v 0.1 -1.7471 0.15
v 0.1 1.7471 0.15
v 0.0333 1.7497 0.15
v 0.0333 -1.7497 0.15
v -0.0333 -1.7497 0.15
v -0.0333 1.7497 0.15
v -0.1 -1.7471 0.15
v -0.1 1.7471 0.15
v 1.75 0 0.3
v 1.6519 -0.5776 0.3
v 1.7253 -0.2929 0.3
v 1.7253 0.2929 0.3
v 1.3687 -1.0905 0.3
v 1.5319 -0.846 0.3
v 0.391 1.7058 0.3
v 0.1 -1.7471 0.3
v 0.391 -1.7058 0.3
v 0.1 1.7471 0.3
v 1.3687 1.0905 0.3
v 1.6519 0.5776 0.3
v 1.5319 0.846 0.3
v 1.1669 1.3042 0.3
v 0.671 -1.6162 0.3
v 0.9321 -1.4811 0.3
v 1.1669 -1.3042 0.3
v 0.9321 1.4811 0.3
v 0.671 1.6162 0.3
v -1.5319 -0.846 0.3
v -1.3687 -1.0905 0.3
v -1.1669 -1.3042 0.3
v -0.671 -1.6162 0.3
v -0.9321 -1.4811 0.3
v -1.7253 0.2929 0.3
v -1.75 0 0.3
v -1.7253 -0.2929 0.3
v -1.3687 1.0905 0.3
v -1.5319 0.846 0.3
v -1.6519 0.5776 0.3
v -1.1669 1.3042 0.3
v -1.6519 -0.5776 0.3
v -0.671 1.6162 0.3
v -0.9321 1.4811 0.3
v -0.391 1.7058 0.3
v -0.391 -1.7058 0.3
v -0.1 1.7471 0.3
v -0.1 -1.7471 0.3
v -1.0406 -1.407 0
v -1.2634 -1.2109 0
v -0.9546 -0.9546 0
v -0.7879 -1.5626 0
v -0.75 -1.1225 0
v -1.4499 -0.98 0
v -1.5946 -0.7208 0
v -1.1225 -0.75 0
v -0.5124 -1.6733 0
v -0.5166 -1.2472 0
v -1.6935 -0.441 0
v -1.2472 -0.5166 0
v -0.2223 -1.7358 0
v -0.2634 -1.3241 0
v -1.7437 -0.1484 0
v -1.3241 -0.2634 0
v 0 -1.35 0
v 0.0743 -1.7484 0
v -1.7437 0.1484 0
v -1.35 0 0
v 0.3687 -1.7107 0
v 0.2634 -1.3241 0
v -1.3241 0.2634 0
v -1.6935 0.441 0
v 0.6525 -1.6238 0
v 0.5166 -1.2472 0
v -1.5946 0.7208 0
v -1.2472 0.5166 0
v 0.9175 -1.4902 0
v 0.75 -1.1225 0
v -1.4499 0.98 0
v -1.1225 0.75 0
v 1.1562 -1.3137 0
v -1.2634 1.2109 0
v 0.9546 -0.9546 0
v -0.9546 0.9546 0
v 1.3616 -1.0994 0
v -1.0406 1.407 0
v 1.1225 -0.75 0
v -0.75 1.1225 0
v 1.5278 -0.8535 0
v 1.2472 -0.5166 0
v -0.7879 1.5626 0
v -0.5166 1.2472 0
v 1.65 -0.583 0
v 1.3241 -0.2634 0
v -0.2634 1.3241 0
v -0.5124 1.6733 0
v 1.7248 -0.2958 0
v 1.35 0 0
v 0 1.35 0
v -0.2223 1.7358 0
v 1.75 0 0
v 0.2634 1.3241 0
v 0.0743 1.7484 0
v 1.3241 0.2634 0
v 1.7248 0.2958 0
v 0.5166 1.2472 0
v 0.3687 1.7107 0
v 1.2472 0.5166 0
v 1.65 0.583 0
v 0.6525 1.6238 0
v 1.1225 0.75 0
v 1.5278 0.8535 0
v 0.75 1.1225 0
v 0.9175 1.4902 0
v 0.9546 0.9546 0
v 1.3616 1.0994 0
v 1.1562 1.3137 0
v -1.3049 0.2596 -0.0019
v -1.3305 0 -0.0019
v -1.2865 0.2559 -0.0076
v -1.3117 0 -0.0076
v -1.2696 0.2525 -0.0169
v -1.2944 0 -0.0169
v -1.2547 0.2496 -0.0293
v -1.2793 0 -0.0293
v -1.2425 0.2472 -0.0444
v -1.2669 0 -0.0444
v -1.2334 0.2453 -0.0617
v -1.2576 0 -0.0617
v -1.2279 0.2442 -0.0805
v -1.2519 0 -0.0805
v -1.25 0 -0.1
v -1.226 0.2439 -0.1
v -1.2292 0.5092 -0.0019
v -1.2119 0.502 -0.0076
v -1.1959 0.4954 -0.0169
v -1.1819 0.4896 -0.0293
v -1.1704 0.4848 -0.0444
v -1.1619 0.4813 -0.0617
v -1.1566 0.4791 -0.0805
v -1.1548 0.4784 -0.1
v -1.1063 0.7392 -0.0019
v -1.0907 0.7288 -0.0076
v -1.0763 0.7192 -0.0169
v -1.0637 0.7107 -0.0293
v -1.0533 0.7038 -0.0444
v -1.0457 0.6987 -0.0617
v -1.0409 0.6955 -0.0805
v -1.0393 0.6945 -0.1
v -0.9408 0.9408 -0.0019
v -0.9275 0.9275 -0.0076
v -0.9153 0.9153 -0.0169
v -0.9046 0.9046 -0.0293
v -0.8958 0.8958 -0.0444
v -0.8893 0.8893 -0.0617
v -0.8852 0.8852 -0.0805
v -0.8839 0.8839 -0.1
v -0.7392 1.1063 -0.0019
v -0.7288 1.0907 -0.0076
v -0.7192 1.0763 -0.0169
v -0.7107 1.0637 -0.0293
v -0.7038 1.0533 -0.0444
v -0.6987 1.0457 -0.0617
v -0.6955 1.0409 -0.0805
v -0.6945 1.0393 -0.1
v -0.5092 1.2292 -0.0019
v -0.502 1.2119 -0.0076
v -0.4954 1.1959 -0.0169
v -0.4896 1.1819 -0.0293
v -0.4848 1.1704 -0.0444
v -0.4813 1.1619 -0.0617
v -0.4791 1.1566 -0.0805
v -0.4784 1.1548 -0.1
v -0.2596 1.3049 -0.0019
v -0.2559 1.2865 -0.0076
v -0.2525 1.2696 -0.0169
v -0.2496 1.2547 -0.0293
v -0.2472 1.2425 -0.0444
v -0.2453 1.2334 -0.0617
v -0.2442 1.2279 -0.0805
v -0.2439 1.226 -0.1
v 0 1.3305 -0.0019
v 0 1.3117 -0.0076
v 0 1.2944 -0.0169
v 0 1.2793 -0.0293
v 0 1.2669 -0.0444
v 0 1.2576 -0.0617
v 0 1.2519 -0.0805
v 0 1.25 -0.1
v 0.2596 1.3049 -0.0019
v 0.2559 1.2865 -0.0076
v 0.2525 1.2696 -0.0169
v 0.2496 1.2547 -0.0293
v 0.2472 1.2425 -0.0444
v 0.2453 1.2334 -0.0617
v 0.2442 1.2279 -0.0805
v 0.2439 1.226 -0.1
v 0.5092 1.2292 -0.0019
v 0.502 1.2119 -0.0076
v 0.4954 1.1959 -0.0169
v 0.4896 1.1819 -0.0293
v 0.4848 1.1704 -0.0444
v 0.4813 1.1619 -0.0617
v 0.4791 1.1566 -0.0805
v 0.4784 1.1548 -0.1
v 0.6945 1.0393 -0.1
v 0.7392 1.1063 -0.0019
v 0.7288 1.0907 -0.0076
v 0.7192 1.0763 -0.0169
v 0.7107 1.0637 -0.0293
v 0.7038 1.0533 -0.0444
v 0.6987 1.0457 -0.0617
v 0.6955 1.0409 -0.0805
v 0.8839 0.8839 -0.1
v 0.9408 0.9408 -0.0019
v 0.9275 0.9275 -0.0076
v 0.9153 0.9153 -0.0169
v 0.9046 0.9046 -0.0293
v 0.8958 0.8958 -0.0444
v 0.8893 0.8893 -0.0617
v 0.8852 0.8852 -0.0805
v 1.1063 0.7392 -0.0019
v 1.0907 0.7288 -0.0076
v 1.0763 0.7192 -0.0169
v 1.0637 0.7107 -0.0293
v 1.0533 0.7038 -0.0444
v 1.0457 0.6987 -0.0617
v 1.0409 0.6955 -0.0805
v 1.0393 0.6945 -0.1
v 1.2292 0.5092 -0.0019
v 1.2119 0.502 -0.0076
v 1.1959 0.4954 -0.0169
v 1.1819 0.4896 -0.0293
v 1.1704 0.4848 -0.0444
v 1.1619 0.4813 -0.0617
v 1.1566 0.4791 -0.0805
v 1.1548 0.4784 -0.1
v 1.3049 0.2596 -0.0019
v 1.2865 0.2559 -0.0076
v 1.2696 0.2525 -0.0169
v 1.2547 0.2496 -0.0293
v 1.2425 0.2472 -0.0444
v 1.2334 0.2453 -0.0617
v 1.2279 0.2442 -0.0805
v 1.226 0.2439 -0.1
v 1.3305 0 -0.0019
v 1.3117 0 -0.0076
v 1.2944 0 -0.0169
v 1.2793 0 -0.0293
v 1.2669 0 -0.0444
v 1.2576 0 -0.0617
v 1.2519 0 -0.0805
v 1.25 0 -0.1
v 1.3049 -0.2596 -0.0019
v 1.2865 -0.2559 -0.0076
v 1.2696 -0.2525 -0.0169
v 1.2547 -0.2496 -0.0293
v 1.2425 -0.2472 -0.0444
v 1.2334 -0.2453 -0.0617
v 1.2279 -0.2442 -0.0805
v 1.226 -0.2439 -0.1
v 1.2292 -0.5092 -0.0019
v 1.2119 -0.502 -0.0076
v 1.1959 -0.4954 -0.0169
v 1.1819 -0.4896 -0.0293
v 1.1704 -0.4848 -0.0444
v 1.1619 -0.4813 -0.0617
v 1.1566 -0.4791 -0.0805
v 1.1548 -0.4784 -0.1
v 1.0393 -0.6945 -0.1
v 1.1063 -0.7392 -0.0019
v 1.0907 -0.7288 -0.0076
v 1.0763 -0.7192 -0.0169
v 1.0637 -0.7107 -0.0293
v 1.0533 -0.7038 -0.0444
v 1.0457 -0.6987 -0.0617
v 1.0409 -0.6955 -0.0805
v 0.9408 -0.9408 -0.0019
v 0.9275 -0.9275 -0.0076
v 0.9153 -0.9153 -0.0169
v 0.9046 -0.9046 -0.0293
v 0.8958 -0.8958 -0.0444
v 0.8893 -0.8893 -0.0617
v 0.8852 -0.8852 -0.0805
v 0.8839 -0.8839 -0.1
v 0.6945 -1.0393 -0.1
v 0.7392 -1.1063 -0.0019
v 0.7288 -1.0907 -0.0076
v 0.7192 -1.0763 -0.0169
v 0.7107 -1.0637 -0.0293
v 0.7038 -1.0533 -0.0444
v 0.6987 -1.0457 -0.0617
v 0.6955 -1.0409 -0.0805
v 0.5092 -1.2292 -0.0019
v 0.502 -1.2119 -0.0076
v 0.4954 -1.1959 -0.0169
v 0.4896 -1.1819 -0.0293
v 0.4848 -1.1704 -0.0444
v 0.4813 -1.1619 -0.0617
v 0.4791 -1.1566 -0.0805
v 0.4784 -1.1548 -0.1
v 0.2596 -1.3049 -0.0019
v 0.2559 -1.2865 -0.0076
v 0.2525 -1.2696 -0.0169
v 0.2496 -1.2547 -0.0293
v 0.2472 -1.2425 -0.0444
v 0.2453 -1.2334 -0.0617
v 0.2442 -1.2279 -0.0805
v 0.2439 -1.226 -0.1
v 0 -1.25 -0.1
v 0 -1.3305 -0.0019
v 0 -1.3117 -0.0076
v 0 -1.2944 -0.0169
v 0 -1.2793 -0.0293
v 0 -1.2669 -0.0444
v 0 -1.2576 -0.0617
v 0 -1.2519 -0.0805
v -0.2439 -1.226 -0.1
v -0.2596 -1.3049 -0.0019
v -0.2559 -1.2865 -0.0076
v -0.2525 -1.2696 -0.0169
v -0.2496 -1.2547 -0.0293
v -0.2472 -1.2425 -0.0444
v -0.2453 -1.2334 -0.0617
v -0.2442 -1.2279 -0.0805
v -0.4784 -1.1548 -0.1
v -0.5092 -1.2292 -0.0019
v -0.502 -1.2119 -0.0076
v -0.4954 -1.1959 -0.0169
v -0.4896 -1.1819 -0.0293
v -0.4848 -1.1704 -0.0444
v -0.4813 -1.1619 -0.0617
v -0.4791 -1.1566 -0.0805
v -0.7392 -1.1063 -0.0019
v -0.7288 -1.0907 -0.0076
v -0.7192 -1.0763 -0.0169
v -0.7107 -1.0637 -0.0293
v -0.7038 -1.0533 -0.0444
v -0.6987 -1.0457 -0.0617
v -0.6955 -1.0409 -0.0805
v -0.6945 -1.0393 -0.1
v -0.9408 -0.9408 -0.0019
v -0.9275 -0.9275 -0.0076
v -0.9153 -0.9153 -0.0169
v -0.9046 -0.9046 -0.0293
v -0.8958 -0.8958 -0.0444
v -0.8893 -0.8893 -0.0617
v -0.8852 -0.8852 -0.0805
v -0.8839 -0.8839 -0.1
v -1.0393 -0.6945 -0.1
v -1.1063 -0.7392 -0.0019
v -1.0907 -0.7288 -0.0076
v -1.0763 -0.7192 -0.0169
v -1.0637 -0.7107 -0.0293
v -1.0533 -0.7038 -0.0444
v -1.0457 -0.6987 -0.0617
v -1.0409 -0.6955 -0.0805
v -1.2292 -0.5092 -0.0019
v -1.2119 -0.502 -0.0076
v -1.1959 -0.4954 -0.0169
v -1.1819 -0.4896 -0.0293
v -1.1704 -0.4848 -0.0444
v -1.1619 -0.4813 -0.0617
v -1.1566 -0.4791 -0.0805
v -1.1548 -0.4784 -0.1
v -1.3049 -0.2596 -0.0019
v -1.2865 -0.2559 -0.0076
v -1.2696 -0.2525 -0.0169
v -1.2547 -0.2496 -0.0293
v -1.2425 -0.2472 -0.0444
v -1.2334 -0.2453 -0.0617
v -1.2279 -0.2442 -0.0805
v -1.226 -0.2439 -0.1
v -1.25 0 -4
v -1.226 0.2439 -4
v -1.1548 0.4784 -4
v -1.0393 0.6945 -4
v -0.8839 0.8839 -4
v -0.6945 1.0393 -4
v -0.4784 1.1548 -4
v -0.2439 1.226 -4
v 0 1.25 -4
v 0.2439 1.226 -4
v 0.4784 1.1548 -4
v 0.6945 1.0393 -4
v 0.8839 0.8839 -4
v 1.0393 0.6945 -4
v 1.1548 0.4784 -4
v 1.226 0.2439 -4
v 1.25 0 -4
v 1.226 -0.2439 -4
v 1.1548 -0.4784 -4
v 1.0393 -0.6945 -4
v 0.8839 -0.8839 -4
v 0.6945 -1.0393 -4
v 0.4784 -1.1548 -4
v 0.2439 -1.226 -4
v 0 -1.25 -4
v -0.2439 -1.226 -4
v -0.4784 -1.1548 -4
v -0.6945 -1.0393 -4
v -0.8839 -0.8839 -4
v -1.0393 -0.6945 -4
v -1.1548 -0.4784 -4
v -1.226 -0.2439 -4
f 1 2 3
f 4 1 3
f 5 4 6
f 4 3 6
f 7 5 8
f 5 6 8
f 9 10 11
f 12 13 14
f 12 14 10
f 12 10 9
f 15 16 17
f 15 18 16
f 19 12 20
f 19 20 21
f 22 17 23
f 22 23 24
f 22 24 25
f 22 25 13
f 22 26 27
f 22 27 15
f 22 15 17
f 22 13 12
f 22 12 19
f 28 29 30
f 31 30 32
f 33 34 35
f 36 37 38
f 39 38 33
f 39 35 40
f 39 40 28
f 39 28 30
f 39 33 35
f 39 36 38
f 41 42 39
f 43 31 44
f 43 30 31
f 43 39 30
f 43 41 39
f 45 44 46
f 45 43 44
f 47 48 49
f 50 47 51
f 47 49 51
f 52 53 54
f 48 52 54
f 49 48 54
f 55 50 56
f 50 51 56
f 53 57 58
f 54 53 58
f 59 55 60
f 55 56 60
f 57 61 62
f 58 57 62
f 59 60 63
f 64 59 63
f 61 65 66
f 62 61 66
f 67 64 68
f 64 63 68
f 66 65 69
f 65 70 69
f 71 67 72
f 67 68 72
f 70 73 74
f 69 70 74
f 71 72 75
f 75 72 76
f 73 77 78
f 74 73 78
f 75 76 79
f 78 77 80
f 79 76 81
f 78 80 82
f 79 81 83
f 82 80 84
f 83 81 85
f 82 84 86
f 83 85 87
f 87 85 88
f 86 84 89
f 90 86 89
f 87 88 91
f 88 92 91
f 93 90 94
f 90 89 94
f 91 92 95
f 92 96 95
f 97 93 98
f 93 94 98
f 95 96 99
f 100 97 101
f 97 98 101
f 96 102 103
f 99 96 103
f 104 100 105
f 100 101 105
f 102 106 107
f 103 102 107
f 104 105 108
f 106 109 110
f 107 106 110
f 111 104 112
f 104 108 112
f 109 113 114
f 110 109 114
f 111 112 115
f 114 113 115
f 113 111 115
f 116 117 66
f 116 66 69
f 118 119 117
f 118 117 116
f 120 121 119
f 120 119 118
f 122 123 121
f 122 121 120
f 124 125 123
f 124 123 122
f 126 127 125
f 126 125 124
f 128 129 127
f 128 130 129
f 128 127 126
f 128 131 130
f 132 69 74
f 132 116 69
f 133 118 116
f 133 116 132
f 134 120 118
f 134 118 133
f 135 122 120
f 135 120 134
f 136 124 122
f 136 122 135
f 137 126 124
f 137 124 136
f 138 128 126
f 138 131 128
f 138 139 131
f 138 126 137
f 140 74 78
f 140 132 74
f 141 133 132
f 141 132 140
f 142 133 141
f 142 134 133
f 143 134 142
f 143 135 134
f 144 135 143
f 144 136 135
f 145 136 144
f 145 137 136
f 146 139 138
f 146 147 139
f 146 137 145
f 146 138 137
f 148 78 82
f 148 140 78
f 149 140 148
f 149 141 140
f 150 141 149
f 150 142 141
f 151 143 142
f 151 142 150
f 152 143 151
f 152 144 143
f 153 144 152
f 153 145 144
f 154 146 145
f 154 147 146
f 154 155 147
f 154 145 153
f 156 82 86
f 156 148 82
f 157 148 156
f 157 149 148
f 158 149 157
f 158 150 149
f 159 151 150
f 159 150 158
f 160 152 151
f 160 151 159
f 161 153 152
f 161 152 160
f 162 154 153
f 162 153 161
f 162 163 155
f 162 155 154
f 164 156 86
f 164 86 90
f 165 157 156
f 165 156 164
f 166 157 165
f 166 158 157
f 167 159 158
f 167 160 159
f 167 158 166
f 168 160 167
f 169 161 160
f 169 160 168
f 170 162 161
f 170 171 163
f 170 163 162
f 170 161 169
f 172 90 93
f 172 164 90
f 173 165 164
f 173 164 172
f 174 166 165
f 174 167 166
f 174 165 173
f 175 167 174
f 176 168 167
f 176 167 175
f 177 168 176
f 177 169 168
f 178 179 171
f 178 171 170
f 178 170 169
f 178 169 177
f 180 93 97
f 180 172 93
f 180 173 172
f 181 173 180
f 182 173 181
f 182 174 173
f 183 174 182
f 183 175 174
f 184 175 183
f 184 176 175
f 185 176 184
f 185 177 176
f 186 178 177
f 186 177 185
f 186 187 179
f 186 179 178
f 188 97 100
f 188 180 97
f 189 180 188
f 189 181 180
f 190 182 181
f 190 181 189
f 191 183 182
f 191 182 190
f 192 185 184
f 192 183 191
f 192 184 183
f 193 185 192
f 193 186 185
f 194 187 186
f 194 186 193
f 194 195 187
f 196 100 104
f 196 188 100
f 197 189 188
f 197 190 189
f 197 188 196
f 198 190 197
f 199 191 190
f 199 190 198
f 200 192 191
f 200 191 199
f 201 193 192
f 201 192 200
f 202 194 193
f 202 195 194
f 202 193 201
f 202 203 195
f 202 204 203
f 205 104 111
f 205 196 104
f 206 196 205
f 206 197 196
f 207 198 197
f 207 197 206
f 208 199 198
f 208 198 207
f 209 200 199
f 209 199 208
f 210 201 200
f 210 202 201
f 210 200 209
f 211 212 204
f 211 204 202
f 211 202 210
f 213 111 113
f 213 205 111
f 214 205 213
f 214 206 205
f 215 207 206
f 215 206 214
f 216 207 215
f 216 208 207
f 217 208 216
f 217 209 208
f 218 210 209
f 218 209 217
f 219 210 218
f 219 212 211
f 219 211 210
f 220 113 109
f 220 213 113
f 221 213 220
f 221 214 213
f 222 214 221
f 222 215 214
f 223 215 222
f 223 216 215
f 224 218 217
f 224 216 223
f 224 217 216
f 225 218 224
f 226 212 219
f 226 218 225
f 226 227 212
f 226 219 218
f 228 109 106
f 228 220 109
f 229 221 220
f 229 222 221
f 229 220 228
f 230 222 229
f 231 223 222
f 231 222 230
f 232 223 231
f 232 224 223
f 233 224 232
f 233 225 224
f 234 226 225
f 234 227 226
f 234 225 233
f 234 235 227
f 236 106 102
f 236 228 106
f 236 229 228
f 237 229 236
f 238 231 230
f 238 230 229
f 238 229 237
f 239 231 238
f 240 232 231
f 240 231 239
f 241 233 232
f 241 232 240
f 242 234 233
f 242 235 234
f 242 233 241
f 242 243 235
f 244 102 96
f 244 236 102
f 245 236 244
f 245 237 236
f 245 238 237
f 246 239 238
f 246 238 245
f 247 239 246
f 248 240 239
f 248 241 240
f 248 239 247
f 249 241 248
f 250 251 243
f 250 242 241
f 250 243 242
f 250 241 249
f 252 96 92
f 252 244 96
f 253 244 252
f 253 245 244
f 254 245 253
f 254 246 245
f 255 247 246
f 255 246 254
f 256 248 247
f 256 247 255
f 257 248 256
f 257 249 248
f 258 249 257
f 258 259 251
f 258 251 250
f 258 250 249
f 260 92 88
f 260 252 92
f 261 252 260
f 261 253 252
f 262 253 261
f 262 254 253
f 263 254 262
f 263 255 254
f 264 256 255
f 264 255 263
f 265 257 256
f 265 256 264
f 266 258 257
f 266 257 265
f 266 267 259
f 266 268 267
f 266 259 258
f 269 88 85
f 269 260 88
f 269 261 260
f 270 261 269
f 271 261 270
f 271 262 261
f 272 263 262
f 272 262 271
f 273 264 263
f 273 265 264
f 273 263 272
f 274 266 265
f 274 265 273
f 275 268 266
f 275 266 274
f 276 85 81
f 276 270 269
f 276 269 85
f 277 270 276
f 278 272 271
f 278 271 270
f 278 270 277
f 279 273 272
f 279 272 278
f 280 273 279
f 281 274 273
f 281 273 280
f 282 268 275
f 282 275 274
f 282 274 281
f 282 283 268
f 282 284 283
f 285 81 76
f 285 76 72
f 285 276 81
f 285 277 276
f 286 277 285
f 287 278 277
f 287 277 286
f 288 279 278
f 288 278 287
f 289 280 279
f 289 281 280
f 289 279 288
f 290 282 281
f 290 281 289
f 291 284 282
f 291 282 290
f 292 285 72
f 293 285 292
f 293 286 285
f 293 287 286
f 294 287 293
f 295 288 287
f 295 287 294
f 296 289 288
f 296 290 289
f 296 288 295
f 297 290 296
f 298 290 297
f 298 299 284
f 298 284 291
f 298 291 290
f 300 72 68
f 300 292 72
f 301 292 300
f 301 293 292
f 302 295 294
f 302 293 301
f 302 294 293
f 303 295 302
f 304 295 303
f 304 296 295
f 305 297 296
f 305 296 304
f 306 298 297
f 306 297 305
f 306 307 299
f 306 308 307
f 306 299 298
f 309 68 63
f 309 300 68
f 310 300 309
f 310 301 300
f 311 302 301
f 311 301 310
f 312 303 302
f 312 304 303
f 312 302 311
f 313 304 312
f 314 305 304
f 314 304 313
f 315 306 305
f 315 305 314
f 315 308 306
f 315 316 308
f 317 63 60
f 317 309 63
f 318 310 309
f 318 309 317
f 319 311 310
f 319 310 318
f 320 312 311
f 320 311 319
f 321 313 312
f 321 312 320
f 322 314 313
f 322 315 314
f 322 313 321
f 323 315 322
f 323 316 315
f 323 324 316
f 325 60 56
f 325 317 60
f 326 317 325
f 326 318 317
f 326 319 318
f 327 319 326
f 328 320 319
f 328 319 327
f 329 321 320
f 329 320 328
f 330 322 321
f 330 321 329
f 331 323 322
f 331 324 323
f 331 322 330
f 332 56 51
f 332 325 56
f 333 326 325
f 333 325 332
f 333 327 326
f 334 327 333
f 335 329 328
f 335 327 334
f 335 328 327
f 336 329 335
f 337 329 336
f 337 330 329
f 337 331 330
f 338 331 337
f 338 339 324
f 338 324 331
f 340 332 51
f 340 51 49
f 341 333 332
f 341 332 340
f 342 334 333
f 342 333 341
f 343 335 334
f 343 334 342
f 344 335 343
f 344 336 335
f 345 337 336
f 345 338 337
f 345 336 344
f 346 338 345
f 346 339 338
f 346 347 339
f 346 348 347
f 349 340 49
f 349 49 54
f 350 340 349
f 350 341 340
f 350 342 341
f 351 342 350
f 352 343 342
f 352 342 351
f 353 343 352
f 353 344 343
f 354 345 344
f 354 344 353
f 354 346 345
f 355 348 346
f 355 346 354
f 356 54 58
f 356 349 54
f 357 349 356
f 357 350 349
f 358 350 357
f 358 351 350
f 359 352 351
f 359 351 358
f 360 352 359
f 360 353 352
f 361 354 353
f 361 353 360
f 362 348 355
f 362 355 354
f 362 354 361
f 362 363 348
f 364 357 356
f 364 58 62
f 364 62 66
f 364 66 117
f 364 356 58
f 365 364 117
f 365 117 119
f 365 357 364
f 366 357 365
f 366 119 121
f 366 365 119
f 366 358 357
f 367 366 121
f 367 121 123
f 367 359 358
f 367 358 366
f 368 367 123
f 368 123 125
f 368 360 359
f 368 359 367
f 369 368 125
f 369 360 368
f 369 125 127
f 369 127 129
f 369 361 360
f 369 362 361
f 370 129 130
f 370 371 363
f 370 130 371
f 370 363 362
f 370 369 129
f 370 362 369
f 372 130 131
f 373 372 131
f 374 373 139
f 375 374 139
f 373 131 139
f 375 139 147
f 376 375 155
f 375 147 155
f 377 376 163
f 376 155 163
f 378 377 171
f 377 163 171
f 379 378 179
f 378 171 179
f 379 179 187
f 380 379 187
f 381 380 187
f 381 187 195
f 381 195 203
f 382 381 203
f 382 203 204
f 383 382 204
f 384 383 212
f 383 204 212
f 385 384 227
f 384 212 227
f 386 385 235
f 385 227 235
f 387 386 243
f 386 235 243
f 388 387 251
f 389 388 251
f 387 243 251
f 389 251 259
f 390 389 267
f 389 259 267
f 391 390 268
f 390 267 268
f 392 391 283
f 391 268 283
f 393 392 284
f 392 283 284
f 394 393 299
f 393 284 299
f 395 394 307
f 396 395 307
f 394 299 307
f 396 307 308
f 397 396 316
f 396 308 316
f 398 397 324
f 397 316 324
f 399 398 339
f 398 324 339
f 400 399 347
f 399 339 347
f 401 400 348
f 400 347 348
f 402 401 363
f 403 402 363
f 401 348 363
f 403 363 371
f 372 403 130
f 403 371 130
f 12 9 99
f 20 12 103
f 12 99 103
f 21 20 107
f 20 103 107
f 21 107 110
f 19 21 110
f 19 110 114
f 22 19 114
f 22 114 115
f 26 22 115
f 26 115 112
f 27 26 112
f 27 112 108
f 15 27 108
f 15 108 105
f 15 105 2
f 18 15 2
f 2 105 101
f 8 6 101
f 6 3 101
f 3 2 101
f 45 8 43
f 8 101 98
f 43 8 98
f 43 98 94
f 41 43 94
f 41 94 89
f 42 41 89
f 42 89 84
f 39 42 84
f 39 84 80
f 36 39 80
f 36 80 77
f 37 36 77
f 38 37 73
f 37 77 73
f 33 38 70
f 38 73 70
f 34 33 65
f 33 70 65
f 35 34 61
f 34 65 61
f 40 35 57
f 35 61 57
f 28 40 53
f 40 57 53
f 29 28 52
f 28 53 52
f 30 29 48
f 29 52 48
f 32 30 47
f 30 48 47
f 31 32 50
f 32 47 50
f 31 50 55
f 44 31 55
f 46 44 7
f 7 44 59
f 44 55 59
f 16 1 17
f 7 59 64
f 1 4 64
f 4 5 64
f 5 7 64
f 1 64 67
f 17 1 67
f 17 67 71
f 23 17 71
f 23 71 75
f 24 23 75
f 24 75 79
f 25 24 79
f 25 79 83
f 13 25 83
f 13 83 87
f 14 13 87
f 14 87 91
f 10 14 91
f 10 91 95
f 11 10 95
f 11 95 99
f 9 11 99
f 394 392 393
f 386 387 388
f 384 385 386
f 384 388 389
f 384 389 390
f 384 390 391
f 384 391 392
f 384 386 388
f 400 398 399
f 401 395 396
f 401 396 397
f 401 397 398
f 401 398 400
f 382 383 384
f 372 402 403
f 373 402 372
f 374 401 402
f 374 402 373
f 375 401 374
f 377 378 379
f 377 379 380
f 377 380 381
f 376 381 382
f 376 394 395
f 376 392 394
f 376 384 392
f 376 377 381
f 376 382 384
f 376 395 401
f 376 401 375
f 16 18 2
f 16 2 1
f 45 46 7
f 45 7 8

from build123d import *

# Parameters (mm, degrees)
CROQUIS1_R              = 1.75
SALIENTE_EXTRUIR1_DEPTH = 0.3
CORTAR_EXTRUIR1_DEPTH   = 0.15
CROQUIS3_R              = 1.25
SALIENTE_EXTRUIR2_DEPTH = 4
REDONDEO1_R             = 0.1


with BuildPart() as part:
    # Croquis1 → Saliente-Extruir1 (new body)
    with BuildSketch(Plane.XY):
        Circle(CROQUIS1_R)
    extrude(amount=SALIENTE_EXTRUIR1_DEPTH)

    # Croquis2 → Cortar-Extruir1 (cut)
    with BuildSketch(Plane.XY.offset(0.3)):
        with BuildLine():
            Line((0.1, 1.747140521), (0.1, -1.747140521))
            ThreePointArc((0.1, -1.747140521), (0, -1.75), (-0.1, -1.747140521))
            Line((-0.1, -1.747140521), (-0.1, 1.747140521))
            ThreePointArc((-0.1, 1.747140521), (0, 1.75), (0.1, 1.747140521))
        make_face()
    extrude(amount=-CORTAR_EXTRUIR1_DEPTH, mode=Mode.SUBTRACT)

    # Croquis3 → Saliente-Extruir2 (add)
    with BuildSketch(Plane(origin=(0, 0, 0), x_dir=(-1, 0, 0), z_dir=(0, 0, -1))):
        Circle(CROQUIS3_R)
    extrude(amount=SALIENTE_EXTRUIR2_DEPTH)

    # Redondeo1
    redondeo1_edges = [part.edges().sort_by_distance(p)[0] for p in [
        (1.25, 0, 0),
    ]]
    fillet(redondeo1_edges, radius=REDONDEO1_R)


solid = part.part
